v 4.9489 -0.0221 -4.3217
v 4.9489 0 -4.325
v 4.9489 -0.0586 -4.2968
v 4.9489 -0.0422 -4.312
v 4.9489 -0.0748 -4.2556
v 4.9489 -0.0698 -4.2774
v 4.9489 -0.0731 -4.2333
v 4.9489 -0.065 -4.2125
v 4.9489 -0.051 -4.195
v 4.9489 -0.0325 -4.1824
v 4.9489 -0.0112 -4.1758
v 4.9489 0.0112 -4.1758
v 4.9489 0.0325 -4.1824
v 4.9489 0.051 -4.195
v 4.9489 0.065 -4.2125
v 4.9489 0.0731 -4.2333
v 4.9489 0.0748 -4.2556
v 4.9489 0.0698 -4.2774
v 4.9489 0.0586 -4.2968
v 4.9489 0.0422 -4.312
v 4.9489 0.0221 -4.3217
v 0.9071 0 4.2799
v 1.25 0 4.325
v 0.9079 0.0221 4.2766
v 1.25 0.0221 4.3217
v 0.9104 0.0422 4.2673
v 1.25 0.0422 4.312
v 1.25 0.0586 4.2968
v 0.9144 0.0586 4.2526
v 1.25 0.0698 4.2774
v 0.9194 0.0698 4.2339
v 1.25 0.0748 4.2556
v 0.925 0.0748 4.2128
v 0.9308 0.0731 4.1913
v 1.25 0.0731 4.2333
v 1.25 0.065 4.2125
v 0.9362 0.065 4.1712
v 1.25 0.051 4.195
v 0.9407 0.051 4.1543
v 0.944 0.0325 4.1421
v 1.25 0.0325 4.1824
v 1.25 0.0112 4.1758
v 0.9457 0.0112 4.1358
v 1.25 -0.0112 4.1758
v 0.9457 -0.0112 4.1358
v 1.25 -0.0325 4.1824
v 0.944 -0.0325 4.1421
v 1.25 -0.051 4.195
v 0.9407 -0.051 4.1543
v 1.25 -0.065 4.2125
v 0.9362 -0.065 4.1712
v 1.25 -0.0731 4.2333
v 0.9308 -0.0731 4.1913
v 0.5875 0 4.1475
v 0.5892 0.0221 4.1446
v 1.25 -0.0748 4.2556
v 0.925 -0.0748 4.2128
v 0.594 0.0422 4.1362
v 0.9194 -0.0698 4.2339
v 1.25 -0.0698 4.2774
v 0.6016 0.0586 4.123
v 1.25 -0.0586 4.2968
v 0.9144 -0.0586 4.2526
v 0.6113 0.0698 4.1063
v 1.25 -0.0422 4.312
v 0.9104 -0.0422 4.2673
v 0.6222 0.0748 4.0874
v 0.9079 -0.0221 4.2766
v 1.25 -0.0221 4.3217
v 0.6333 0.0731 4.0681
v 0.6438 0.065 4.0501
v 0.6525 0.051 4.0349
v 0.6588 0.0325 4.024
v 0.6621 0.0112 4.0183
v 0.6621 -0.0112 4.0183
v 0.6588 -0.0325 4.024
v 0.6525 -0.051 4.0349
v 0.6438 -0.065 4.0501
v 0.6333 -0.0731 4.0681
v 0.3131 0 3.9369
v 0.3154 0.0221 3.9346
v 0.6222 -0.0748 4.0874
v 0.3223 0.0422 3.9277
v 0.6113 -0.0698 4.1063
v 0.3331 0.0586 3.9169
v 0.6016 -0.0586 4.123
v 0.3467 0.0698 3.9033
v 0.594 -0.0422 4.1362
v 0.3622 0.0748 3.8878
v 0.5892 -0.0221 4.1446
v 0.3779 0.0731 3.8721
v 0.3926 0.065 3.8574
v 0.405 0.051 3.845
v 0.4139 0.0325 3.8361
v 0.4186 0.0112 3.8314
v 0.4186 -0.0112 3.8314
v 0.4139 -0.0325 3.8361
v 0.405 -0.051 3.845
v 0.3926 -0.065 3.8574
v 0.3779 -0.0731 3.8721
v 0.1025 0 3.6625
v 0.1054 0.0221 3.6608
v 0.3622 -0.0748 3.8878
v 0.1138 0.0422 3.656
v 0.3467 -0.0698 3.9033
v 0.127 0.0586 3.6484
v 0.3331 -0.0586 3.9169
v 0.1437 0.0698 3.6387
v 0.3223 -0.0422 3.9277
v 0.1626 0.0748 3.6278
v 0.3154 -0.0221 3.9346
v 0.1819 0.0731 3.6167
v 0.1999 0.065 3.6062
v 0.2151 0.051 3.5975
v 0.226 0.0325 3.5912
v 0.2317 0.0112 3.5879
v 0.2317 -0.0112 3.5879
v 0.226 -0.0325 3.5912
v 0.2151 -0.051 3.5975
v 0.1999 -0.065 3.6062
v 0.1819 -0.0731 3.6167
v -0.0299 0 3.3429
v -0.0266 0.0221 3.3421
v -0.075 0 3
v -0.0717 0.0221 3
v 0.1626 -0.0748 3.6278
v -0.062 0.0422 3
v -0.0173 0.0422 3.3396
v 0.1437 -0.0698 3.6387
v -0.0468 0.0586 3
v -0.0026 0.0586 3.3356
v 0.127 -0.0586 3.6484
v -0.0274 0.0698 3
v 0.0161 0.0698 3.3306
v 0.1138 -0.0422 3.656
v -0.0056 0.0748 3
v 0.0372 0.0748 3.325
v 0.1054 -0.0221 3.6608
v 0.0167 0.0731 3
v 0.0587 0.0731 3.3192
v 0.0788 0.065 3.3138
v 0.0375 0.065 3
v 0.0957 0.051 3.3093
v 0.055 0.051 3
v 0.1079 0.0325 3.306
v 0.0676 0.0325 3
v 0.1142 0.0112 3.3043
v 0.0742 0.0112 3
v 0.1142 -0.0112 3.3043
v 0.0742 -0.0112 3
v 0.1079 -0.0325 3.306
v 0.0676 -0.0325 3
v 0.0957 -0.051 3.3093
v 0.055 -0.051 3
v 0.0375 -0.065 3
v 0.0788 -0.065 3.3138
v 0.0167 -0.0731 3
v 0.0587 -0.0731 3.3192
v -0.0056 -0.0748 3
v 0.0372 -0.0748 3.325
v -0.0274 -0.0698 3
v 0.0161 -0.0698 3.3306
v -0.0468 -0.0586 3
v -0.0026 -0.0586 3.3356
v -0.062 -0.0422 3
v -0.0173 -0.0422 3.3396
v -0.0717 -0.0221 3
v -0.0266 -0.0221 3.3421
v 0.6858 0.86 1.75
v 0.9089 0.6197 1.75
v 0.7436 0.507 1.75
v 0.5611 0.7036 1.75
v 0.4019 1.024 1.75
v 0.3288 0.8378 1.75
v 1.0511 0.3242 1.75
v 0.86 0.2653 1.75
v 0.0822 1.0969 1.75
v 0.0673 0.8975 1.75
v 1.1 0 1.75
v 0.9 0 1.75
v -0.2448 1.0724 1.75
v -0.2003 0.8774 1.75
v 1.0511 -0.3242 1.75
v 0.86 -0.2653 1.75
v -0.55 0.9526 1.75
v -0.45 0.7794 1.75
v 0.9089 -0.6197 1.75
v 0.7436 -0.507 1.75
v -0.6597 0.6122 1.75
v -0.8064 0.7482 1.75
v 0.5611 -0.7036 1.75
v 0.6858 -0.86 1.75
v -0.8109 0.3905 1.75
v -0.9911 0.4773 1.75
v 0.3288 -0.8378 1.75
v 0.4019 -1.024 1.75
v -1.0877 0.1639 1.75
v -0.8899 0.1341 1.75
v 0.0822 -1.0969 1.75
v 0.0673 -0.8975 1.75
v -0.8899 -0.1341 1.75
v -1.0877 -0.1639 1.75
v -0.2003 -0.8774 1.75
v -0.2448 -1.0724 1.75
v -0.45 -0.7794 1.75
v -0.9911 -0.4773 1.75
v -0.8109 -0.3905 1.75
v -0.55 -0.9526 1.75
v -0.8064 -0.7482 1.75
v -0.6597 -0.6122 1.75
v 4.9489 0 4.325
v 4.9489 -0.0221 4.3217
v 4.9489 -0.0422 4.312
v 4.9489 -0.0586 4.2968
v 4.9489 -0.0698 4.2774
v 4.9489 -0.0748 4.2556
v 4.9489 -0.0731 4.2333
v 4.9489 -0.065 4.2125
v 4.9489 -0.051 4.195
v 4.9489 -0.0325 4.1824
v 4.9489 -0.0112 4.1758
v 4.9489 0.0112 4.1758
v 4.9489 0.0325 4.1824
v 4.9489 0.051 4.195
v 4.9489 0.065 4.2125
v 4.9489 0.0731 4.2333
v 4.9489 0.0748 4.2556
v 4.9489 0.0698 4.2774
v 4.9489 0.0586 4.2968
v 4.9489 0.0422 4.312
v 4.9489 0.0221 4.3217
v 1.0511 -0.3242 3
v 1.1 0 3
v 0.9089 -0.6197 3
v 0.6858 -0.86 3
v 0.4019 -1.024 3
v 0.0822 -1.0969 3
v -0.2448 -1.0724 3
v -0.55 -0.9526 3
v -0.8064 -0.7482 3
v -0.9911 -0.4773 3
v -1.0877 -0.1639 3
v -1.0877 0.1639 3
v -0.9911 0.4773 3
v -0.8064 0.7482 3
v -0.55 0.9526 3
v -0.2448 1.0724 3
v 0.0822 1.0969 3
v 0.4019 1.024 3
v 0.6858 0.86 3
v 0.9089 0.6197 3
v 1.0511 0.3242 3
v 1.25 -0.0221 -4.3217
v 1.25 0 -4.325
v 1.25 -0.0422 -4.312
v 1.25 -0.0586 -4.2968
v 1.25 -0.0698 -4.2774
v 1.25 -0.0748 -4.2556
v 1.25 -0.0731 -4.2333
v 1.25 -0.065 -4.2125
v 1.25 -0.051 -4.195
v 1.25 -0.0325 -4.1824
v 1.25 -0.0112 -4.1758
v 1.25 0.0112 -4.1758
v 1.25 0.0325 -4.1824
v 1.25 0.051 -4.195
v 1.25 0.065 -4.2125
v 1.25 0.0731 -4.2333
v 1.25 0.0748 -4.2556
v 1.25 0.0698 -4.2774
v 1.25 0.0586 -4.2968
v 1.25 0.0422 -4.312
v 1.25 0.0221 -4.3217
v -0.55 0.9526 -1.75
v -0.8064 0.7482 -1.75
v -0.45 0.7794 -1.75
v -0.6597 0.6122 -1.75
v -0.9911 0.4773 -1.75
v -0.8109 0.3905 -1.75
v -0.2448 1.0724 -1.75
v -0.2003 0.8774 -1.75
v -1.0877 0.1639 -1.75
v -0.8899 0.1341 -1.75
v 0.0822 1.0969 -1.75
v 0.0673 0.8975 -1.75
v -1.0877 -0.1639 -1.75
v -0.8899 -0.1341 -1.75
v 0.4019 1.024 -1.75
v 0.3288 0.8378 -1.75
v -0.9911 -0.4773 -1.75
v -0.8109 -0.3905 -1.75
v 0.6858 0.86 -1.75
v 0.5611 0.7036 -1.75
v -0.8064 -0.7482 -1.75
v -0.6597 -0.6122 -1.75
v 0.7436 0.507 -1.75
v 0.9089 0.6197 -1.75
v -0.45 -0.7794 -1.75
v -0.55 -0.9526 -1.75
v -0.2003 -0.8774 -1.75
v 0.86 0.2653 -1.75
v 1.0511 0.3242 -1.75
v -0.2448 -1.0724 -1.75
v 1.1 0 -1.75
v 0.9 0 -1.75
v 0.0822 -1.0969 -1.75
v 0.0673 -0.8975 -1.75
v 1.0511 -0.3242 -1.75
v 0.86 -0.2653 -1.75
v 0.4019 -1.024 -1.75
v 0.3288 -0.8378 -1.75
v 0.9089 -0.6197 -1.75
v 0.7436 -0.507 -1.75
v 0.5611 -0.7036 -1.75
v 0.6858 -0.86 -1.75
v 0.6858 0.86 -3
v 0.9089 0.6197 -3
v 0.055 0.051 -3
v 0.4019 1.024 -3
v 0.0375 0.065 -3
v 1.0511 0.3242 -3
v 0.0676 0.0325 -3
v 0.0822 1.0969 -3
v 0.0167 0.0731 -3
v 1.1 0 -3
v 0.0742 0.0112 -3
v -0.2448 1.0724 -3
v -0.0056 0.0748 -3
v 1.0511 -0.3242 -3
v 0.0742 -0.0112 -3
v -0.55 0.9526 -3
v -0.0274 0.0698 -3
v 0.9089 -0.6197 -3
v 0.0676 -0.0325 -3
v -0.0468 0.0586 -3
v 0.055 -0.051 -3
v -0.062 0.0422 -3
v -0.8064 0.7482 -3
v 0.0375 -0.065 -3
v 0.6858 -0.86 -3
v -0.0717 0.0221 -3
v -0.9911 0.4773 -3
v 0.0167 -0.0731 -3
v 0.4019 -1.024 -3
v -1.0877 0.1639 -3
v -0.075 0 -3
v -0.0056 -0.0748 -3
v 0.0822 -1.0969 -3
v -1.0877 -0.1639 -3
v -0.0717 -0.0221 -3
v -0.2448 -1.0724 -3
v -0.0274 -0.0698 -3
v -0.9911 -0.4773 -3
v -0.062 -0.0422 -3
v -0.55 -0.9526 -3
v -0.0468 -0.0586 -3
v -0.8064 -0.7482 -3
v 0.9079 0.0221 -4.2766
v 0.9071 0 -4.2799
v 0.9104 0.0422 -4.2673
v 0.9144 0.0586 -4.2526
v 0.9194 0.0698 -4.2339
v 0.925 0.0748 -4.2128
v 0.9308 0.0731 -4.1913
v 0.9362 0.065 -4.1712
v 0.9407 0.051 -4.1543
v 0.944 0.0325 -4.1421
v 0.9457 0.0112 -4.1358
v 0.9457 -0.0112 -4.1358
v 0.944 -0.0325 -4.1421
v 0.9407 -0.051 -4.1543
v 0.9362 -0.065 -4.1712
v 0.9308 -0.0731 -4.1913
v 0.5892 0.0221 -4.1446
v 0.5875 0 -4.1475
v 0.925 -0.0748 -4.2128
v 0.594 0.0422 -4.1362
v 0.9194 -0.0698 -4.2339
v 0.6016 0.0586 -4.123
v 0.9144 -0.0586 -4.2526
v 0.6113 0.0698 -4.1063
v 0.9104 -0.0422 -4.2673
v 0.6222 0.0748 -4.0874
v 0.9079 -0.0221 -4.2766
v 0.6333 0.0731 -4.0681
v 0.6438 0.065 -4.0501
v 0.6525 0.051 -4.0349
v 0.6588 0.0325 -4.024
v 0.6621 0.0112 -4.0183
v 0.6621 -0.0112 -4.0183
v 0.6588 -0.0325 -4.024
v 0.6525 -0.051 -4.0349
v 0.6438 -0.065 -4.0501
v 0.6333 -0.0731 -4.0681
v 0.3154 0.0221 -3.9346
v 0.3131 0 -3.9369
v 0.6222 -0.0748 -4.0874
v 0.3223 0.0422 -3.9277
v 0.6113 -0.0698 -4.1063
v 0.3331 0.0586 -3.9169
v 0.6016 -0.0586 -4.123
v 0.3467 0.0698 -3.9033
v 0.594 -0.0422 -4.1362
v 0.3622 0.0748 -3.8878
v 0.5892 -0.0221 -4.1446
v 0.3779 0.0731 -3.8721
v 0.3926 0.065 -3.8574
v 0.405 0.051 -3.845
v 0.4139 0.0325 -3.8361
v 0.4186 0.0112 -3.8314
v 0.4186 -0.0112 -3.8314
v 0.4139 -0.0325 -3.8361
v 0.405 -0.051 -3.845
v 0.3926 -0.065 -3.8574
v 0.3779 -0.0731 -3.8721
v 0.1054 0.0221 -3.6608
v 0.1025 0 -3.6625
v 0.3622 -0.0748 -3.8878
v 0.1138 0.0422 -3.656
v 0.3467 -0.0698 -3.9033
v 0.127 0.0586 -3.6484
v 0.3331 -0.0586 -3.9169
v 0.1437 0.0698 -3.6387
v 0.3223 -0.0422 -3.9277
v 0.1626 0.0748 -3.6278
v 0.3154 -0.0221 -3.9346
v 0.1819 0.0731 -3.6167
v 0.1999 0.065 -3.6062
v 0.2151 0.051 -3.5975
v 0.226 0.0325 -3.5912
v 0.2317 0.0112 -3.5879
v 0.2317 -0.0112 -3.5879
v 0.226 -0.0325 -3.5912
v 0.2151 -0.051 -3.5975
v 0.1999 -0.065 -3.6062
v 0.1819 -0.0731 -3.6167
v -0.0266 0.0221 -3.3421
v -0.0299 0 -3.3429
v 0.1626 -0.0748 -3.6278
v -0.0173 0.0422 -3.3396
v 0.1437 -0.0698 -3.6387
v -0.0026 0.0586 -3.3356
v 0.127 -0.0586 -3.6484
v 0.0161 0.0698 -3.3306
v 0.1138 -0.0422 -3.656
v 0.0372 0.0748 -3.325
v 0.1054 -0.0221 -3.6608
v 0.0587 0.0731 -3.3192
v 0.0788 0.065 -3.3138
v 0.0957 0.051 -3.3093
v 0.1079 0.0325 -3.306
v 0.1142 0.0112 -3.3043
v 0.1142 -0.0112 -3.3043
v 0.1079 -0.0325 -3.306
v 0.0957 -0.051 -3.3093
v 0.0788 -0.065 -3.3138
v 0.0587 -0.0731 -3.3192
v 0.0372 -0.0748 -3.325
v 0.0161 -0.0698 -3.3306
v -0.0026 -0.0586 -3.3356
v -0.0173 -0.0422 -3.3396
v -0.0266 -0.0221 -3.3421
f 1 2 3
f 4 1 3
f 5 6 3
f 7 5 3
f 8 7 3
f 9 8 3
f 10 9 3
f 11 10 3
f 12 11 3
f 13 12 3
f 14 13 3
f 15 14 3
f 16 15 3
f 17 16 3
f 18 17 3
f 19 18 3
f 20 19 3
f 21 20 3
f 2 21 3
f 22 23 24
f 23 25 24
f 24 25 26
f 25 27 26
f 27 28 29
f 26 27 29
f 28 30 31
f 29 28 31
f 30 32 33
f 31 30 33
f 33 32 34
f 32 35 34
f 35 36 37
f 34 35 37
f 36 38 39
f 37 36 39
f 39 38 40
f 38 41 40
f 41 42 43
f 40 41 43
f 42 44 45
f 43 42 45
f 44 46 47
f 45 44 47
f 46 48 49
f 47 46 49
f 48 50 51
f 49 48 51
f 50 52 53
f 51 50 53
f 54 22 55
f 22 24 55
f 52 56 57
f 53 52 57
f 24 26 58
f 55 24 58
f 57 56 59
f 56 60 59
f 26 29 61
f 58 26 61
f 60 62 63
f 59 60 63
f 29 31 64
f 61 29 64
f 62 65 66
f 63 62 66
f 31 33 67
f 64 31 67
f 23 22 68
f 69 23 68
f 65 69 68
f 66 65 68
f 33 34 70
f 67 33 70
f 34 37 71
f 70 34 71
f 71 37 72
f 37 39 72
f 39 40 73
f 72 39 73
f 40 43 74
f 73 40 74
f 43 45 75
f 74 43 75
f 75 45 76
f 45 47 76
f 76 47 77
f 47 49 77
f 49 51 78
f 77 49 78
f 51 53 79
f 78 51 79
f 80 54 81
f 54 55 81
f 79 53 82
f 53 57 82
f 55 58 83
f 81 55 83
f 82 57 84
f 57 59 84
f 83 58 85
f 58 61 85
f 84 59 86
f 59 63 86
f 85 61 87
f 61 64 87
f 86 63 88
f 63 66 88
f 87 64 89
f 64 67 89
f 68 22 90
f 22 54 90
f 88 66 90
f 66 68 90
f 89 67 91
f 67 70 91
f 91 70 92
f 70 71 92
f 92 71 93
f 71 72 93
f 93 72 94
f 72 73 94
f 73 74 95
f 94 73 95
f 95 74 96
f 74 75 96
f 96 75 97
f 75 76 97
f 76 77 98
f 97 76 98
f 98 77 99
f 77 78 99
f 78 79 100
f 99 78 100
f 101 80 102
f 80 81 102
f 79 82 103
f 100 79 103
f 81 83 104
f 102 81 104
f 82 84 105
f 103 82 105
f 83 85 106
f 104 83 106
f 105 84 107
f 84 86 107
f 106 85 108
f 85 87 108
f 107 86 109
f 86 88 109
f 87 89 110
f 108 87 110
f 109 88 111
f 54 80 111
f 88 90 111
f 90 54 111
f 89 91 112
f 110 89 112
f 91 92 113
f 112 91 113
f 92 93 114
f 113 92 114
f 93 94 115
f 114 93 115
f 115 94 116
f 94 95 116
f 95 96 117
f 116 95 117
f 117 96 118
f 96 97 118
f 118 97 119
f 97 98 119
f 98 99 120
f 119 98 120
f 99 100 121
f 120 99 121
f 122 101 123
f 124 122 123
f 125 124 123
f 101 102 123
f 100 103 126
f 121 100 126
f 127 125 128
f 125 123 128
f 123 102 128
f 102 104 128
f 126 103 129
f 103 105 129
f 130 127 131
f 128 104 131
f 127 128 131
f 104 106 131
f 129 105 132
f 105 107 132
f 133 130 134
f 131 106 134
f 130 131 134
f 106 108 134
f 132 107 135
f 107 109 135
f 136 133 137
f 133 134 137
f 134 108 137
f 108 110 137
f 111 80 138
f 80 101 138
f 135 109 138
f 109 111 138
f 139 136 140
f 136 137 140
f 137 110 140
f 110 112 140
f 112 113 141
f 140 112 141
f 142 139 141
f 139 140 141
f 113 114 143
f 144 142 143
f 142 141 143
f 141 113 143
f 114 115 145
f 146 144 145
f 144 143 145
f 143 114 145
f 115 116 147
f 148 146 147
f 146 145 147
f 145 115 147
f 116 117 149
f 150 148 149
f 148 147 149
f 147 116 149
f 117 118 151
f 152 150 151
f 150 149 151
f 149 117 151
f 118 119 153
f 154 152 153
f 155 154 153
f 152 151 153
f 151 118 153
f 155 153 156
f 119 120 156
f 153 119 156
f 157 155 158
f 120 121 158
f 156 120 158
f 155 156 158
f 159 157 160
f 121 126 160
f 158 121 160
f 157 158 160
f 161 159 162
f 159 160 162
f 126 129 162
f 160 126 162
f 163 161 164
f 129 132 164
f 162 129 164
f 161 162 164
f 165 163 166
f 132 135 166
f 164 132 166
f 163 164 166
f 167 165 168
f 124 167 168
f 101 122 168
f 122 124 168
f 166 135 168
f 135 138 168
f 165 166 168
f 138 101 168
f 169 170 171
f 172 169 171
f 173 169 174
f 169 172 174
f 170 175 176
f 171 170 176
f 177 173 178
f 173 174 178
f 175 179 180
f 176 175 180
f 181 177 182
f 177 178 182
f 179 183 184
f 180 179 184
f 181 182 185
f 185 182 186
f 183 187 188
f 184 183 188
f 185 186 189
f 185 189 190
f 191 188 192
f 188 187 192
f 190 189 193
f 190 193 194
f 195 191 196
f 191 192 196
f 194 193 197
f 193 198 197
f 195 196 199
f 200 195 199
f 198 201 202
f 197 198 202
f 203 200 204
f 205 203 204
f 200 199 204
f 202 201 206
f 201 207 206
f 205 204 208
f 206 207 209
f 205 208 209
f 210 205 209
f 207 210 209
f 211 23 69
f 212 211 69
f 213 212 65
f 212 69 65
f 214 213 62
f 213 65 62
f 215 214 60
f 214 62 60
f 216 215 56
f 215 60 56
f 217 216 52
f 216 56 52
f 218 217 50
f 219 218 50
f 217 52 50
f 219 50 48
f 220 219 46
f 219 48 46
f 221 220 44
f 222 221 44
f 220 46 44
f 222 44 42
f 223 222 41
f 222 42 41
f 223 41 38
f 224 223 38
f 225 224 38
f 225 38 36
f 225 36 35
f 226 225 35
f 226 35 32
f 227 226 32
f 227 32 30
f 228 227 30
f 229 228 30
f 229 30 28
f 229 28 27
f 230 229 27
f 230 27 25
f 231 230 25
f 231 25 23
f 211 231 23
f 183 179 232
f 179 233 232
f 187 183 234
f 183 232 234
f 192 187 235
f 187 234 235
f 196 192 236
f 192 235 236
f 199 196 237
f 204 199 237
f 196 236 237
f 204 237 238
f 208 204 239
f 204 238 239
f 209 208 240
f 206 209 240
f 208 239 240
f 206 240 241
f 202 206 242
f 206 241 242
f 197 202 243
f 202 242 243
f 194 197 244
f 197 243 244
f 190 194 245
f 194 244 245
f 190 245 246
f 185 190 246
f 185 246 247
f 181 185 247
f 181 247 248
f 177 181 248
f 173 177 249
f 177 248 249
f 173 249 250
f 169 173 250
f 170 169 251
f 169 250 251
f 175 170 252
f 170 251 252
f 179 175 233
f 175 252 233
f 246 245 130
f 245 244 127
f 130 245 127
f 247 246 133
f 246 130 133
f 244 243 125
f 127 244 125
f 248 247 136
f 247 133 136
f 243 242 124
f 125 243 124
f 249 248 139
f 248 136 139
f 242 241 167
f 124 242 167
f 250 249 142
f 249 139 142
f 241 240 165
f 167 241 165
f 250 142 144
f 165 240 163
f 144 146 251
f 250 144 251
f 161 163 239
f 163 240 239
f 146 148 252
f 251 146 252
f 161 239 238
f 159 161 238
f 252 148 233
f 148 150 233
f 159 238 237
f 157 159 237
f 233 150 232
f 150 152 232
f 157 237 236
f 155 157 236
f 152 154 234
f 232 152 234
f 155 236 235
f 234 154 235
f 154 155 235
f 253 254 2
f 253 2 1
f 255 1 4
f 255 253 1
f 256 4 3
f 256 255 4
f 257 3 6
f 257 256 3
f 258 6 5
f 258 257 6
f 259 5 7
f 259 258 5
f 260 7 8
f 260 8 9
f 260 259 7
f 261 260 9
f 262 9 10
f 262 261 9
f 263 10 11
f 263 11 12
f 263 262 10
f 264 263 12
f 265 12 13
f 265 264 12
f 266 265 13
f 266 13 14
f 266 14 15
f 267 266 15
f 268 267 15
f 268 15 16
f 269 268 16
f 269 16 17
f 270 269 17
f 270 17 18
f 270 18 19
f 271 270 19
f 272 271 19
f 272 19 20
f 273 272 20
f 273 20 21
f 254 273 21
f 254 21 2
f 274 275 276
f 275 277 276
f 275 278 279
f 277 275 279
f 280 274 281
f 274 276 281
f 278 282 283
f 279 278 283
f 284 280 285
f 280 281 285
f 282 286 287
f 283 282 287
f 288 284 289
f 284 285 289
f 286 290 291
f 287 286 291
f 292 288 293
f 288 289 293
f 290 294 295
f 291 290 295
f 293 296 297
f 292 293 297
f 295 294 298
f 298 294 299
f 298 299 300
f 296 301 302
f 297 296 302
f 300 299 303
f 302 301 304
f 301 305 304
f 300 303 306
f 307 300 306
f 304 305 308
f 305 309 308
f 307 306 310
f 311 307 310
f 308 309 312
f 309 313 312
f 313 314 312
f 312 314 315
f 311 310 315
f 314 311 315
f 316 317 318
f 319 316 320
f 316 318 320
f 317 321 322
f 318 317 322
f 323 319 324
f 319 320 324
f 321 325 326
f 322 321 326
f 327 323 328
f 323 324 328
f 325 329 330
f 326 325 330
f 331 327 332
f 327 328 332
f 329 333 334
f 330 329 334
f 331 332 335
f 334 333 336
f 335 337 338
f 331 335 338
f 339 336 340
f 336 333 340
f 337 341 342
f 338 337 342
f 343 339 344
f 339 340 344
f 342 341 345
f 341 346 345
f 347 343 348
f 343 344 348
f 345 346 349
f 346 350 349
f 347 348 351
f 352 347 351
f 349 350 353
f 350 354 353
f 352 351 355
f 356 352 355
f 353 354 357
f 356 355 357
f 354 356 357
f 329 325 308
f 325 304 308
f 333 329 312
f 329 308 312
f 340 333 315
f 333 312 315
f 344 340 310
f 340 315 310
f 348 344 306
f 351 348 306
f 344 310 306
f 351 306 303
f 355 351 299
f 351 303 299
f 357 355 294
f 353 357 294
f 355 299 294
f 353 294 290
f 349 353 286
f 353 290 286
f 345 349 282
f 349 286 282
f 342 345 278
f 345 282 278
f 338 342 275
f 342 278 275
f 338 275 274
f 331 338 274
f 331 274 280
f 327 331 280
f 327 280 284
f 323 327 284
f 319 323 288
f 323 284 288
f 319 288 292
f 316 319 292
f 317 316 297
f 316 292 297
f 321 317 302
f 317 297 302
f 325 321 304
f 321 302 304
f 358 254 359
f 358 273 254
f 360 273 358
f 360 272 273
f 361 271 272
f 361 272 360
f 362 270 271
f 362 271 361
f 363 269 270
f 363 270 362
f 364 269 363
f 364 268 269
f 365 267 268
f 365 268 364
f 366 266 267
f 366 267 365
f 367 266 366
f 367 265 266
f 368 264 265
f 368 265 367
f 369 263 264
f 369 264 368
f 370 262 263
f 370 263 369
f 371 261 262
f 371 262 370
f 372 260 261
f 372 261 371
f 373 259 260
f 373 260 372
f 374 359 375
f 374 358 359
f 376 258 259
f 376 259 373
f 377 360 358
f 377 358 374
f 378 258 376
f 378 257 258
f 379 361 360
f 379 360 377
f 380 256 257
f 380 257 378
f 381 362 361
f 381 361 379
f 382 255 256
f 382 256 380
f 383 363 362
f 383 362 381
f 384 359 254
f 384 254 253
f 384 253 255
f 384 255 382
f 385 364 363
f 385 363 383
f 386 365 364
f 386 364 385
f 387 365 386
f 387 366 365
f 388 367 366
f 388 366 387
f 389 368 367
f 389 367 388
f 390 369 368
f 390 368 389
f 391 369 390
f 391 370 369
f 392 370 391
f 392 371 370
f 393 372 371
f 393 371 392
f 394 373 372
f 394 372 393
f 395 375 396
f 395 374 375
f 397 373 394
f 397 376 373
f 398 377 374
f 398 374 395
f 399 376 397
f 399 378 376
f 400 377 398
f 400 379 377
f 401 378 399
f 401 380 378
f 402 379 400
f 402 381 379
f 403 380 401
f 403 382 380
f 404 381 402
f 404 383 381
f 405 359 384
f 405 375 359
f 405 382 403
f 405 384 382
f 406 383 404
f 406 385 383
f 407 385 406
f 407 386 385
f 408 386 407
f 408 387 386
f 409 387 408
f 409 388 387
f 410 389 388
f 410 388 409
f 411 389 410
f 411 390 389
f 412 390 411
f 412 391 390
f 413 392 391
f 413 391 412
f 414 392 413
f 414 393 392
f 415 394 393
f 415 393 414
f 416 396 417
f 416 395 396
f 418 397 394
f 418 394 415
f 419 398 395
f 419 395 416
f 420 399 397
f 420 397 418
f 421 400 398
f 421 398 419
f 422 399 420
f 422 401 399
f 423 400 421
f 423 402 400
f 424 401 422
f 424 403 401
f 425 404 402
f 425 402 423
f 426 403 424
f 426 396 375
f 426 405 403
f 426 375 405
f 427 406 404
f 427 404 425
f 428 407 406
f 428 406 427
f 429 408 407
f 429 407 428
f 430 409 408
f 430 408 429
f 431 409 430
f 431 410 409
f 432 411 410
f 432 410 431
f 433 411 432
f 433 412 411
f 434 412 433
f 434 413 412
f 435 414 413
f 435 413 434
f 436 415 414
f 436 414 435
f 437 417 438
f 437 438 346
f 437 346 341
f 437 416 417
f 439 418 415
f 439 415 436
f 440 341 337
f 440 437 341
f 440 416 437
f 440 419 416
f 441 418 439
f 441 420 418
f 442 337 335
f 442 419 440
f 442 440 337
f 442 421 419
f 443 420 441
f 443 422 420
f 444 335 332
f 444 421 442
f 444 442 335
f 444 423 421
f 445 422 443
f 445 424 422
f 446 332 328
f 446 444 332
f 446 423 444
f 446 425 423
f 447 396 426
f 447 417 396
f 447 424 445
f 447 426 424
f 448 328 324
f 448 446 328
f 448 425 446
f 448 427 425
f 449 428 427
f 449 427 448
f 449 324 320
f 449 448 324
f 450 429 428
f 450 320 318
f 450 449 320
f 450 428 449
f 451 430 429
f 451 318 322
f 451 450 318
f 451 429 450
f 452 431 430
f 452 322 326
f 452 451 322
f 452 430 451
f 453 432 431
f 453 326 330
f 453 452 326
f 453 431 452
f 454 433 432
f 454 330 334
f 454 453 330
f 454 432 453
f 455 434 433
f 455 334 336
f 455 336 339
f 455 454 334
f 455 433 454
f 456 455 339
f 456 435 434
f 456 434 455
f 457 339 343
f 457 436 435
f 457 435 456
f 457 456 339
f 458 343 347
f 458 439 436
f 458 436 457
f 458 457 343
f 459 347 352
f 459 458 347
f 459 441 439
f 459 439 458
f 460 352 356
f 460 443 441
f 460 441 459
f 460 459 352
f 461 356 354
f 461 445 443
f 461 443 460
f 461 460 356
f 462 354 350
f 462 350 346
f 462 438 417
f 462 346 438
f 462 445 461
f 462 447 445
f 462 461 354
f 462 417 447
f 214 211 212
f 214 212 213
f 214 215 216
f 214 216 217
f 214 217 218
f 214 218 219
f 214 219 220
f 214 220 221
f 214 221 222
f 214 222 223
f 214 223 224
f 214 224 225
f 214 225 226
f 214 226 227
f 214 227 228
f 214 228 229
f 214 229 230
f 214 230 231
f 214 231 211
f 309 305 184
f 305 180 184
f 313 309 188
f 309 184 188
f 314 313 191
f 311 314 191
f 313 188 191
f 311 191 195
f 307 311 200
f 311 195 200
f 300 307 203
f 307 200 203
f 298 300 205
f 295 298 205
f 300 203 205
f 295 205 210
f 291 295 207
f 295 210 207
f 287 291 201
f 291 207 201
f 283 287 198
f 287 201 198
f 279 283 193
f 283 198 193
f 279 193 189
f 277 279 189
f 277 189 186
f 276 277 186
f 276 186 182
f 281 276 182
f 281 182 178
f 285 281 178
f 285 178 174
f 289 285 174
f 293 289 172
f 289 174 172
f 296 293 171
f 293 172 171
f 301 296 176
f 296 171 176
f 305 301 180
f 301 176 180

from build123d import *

# Parameters (mm, degrees)
SWEEP_1_PROFILE_R = 0.075


with BuildPart() as part:
    # 草图1 → 旋转1 (revolve)
    with BuildSketch(Plane(origin=(0, 0, 0), x_dir=(1, 0, 0), z_dir=(0, 1, 0))):
        Polygon((0.9, -1.75), (1.1, -1.75), (1.1, -3), (0, -3), (0, 3), (1.1, 3), (1.1, 1.75), (0.9, 1.75), align=None)
    revolve(axis=Axis((0, 0, 3), (0, 0, -1)))

    # 扫描1: sweep along a path in 草图6
    with BuildLine(Plane(origin=(0, 0, 0), x_dir=(1, 0, 0), z_dir=(0, 1, 0))) as sweep_1_path:
        Line((4.948876204, 4.25), (1.25, 4.25))
        ThreePointArc((1.25, 4.25), (0.366116524, 3.883883476), (0, 3))
    # 扫描1 profile (on start of the path) → 扫描1 (sweep)
    with BuildSketch(Plane(origin=(4.948876204, 0, -4.25), x_dir=(0, 0, -1), z_dir=(-1, 0, 0))):
        Circle(SWEEP_1_PROFILE_R)
    sweep_1 = sweep(path=sweep_1_path.line)

    # 镜向1: 扫描1 across plane
    add(sweep_1.mirror(Plane.XY))


solid = part.part
